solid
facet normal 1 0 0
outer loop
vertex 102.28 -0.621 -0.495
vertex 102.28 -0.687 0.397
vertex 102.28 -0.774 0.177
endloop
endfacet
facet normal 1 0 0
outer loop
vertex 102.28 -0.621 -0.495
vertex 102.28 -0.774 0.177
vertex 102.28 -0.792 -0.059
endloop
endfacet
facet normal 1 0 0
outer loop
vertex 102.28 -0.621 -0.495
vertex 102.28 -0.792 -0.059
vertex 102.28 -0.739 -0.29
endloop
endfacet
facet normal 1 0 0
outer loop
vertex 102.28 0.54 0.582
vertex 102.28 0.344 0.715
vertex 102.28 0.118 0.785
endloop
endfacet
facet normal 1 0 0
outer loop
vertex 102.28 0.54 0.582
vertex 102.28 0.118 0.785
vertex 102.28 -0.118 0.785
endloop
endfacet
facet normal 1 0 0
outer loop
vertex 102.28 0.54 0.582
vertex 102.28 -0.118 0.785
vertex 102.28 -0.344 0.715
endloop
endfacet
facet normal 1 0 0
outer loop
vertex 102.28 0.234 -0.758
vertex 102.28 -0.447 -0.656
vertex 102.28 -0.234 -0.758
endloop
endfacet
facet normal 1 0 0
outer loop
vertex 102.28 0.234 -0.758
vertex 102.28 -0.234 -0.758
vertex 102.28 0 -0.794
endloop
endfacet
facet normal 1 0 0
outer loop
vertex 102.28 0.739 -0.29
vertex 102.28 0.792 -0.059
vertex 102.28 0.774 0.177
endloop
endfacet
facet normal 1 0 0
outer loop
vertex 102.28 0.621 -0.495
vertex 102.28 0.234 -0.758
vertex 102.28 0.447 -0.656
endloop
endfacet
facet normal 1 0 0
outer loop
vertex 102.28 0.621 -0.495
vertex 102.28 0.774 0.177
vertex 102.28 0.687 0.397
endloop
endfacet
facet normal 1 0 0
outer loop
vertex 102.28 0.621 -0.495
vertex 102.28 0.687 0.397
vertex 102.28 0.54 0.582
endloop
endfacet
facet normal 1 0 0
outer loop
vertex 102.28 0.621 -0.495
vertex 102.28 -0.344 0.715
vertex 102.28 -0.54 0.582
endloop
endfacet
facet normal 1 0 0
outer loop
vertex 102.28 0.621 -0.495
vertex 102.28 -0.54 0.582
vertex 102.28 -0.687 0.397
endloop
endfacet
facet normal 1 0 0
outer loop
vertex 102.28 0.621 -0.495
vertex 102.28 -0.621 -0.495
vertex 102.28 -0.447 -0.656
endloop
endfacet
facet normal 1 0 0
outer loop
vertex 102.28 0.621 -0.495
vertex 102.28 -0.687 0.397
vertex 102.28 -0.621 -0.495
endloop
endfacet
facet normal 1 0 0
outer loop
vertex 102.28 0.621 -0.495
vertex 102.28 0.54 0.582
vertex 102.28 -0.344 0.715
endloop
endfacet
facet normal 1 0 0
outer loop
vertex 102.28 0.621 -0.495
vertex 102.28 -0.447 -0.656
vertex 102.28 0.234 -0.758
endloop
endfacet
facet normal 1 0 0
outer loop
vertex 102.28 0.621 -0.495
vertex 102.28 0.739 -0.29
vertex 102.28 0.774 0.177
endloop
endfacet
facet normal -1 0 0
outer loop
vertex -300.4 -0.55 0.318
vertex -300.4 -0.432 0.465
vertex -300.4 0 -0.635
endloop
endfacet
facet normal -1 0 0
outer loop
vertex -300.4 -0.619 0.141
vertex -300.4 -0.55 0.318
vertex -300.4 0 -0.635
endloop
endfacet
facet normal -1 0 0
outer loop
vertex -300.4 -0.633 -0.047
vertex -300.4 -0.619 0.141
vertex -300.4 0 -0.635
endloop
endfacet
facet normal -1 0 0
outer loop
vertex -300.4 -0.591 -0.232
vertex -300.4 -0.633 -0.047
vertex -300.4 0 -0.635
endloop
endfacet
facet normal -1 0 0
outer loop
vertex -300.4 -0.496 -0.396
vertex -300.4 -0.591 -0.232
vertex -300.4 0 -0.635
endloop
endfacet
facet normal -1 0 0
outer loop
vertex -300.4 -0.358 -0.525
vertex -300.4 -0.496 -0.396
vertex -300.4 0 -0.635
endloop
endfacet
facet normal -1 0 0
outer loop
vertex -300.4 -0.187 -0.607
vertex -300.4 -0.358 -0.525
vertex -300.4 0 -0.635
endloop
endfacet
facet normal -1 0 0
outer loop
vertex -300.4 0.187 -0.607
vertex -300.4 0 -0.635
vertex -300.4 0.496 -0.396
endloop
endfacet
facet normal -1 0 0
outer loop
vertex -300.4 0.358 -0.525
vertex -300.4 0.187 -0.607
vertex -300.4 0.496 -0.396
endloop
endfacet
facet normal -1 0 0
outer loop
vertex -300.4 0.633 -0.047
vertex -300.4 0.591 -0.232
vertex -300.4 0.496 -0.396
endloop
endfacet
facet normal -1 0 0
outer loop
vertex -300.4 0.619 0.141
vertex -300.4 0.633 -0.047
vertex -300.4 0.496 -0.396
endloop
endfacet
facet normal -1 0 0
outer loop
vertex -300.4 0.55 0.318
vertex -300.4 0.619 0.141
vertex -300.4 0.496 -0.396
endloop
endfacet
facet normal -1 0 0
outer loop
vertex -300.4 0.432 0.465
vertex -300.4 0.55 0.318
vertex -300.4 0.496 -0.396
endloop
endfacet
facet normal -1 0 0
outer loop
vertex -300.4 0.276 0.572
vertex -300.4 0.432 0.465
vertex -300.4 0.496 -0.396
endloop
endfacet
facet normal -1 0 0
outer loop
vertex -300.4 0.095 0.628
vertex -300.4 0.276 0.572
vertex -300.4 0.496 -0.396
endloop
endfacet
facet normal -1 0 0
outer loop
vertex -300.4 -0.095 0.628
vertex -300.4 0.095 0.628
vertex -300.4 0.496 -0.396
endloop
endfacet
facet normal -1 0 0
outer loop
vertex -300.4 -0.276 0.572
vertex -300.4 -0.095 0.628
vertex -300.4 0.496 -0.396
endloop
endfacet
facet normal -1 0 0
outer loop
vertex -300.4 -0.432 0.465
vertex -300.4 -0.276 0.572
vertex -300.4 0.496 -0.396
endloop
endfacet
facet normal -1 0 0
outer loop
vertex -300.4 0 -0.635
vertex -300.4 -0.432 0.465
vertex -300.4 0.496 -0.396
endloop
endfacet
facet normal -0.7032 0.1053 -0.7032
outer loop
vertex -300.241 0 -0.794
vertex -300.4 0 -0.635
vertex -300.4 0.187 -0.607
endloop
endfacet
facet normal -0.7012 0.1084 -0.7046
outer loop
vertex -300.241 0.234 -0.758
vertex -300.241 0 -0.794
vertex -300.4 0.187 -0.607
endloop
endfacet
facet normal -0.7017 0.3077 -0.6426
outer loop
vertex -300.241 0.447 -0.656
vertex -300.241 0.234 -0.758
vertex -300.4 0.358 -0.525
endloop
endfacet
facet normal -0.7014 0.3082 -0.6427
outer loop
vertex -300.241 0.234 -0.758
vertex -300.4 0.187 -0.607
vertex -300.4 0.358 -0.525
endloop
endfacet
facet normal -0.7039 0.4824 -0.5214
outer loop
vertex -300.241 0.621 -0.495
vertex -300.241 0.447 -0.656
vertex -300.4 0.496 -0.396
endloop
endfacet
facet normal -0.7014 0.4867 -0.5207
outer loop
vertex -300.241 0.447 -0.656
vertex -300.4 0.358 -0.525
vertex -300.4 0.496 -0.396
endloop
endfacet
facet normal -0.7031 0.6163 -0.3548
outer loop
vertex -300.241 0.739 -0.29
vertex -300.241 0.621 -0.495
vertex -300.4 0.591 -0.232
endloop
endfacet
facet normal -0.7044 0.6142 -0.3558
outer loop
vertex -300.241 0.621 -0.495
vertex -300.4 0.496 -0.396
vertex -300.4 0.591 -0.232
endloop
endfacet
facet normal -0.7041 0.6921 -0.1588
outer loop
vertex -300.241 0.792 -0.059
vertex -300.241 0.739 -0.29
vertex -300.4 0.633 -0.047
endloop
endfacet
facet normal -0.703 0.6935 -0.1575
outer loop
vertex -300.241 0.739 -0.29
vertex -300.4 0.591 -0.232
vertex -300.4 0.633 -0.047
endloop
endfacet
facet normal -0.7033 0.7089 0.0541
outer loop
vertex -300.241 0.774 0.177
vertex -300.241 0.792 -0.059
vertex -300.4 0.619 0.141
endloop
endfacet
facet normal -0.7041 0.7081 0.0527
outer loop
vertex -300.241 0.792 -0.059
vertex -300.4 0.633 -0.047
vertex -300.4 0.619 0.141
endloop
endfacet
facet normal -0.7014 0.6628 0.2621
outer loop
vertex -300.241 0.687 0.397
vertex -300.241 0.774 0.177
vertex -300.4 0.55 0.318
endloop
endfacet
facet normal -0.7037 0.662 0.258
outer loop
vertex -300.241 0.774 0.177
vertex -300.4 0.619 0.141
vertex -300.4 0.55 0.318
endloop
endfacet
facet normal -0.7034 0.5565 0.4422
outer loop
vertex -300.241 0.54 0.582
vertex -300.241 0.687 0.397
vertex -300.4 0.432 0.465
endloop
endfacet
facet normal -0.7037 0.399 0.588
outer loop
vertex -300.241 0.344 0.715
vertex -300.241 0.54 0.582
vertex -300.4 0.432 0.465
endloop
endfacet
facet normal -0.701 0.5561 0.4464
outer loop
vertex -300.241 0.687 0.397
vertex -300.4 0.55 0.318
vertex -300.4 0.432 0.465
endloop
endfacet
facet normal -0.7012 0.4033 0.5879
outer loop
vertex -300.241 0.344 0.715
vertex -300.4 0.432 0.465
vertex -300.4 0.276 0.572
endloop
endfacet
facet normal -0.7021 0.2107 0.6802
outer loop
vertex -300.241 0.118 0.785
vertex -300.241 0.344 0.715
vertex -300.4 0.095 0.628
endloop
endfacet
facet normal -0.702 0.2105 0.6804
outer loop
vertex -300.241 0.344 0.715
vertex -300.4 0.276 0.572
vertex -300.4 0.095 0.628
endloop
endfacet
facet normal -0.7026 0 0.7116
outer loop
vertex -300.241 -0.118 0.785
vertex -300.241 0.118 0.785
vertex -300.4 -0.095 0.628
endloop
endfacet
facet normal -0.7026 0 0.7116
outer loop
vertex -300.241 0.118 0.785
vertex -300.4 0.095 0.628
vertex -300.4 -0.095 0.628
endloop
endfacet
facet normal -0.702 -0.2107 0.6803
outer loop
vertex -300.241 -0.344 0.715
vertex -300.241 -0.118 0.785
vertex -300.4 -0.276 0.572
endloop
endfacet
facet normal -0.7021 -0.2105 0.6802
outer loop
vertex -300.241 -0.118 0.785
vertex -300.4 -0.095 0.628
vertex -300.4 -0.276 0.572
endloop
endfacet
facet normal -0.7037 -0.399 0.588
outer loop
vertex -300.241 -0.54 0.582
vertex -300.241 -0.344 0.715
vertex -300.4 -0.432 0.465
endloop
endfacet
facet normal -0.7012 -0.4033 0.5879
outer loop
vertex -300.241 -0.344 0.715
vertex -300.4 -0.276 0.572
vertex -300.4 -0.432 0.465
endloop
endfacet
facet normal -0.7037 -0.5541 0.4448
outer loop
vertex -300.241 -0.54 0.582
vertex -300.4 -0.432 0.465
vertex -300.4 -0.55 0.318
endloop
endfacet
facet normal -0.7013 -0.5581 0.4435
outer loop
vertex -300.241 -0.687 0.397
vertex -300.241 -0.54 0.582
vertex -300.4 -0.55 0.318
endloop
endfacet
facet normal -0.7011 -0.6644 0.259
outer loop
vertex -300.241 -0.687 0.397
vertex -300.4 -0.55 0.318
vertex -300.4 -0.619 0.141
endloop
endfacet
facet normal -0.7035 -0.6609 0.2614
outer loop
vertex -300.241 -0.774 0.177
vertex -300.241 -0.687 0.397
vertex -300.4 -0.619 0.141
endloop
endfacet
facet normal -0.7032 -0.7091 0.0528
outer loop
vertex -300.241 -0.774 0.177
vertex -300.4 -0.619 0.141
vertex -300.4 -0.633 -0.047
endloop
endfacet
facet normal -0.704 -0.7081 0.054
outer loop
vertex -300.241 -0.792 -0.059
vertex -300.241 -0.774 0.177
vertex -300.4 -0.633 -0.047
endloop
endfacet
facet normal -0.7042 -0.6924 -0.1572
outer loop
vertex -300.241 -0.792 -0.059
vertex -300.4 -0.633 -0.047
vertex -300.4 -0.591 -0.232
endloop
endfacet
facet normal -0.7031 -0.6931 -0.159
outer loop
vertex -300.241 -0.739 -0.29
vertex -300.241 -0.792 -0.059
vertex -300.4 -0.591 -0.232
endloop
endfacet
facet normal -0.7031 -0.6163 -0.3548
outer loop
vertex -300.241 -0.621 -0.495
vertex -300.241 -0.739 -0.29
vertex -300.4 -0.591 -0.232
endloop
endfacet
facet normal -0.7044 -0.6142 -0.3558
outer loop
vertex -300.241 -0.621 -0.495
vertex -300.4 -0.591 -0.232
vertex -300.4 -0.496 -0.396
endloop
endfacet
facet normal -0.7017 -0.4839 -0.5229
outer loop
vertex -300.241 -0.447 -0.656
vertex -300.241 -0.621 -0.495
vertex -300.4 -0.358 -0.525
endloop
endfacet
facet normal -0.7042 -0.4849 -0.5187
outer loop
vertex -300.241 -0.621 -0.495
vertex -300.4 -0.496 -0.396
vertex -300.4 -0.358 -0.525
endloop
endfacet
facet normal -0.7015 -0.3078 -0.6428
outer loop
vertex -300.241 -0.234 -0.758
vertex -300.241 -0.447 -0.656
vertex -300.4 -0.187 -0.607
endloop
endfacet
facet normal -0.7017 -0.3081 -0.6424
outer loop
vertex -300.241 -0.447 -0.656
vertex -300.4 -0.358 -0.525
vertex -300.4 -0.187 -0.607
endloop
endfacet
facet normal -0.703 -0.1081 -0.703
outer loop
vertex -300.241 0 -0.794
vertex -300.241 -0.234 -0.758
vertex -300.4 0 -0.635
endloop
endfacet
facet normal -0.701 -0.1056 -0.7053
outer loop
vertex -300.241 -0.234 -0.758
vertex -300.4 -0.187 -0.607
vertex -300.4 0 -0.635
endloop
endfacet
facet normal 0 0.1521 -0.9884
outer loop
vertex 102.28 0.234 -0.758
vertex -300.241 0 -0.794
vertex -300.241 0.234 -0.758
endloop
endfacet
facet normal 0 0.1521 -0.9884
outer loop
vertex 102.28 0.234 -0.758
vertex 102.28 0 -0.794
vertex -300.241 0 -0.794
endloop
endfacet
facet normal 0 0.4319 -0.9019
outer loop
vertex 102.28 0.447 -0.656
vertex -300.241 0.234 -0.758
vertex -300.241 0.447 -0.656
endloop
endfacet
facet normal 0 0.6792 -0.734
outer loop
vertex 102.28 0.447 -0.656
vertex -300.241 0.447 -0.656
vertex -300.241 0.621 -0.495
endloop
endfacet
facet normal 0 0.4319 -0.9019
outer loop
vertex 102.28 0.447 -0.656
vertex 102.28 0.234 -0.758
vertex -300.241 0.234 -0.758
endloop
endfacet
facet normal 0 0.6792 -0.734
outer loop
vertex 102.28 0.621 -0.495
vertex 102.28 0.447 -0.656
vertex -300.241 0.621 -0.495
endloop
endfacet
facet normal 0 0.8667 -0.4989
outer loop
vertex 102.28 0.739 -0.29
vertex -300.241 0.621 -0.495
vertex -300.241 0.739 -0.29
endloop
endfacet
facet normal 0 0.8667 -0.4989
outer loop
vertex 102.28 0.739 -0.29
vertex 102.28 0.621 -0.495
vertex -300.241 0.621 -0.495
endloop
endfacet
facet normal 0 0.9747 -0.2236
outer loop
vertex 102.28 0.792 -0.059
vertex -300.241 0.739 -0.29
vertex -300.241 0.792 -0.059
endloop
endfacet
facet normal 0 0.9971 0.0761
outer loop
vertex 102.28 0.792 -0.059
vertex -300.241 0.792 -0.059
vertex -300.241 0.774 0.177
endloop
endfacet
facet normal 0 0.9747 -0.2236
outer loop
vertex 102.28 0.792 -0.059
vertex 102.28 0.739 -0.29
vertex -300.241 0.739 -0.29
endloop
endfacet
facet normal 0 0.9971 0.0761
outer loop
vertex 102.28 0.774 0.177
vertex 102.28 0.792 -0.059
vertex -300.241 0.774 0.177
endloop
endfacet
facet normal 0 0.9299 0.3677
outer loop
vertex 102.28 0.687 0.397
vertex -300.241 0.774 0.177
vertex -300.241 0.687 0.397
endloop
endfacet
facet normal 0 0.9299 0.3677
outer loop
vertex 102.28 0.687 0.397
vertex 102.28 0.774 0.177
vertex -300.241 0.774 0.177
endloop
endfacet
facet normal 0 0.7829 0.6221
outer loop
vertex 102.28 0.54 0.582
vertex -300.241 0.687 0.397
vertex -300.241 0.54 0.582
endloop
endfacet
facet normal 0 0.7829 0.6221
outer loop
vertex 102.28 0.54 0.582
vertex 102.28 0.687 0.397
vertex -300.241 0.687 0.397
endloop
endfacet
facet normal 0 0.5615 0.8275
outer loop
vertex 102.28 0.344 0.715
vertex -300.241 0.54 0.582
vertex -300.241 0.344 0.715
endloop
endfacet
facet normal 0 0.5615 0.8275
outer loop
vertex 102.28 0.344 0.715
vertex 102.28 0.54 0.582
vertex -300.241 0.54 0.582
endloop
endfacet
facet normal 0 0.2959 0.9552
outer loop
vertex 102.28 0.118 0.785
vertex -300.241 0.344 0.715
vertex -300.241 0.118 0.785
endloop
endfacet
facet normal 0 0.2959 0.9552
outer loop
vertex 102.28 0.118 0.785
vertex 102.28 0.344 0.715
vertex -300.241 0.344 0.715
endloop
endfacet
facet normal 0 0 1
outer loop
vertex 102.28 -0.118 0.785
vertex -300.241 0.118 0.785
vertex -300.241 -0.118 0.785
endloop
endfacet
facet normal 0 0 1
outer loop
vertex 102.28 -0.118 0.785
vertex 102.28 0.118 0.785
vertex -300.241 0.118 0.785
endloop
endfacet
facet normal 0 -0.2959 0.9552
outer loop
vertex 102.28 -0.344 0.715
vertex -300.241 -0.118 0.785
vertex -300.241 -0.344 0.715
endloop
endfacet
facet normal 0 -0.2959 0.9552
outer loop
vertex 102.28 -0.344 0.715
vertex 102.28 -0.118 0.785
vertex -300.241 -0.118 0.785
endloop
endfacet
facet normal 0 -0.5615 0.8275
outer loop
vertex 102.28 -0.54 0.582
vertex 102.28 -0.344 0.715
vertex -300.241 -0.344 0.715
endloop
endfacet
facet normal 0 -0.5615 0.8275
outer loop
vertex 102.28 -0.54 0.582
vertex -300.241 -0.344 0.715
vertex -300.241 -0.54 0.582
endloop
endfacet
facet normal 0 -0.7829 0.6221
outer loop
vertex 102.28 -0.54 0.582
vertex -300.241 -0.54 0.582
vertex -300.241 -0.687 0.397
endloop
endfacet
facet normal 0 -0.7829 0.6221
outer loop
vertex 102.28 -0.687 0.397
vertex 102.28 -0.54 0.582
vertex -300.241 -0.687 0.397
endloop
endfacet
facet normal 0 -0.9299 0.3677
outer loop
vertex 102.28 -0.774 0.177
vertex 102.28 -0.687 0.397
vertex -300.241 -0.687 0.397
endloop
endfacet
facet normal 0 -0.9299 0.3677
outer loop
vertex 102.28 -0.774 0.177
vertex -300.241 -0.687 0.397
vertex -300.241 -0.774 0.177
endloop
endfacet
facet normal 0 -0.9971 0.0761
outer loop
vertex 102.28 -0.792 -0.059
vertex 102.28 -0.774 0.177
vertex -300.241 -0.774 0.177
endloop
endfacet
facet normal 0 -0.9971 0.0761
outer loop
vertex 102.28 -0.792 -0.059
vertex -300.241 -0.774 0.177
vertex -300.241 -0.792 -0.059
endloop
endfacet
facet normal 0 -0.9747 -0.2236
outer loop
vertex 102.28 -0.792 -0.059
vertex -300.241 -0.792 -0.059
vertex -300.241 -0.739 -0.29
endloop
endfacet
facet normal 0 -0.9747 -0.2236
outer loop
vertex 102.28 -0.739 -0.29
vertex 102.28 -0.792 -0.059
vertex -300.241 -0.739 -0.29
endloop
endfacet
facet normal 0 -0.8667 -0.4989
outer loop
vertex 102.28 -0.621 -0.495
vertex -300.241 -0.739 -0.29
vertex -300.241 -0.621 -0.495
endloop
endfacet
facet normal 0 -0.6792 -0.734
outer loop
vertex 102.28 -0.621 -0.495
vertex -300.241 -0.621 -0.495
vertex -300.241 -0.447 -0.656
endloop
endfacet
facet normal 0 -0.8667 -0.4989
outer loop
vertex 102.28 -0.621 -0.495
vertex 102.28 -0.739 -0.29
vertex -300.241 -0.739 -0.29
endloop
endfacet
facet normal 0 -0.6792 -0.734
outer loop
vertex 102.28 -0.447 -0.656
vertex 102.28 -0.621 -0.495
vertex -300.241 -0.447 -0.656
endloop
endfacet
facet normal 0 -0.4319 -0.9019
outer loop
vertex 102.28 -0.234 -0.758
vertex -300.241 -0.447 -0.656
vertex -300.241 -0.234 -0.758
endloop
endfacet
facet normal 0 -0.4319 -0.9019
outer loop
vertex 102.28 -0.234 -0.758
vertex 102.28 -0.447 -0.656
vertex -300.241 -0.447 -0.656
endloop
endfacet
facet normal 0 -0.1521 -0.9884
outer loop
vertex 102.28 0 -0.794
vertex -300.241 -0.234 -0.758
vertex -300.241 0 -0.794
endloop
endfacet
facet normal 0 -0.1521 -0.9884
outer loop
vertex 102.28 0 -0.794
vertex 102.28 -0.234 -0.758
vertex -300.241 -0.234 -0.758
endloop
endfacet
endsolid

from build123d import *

# Parameters (mm, degrees)
SKETCH10_R          = 0.79375
BOSS_EXTRUDE3_DEPTH = 300.4
CHAMFER1_SIZE       = 0.15875
SKETCH13_R          = 1.981721066
CUT_EXTRUDE4_DEPTH  = 198.12


with BuildPart() as part:
    # Sketch10 → Boss-Extrude3 (new, symmetric)
    with BuildSketch(Plane(origin=(0, 0, 0), x_dir=(0, 0, -1), z_dir=(1, 0, 0))):
        Circle(SKETCH10_R)
    extrude(amount=BOSS_EXTRUDE3_DEPTH, both=True)

    # Chamfer1
    chamfer1_edges = [part.edges().sort_by_distance(p)[0] for p in [
        (-300.4, 0, 0.79375),
        (300.4, 0, 0.79375),
    ]]
    chamfer(chamfer1_edges, length=CHAMFER1_SIZE)

    # Sketch13 → Cut-Extrude4 (cut)
    with BuildSketch(Plane(origin=(300.4, 0, 0), x_dir=(0, 0, -1), z_dir=(1, 0, 0))):
        Circle(SKETCH13_R)
    extrude(amount=-CUT_EXTRUDE4_DEPTH, mode=Mode.SUBTRACT)


solid = part.part
